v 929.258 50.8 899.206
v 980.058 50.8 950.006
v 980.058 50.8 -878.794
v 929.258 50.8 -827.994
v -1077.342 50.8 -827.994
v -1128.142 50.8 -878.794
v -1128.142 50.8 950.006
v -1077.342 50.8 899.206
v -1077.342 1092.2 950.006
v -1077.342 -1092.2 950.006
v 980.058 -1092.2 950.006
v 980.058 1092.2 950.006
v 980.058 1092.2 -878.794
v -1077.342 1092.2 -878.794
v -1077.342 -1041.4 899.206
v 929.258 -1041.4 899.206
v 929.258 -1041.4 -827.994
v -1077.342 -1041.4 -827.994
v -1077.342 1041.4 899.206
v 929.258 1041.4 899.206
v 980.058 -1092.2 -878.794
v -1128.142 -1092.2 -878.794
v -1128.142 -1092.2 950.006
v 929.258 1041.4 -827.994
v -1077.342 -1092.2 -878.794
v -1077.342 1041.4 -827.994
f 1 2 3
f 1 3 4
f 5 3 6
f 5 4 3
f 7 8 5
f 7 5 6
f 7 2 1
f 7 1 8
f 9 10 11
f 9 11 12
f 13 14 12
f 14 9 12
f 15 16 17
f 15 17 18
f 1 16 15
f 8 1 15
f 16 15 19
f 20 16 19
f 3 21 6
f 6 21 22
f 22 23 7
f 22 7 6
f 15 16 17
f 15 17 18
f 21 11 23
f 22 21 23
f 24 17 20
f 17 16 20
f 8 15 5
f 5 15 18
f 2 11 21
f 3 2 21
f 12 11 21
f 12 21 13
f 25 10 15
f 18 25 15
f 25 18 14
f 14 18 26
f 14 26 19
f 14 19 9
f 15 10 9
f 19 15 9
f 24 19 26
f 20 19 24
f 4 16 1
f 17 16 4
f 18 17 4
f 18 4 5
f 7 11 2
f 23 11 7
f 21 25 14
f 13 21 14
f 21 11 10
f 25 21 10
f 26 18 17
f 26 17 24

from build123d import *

# Parameters (mm, degrees)
F0_W     = 97.2830057144
F0_H     = 71.2111592293
F1_DEPTH = 1092.2
F2_DEPTH = 1028.7
F3_DEPTH = 914.4
F4_T     = -50.8
F5_DEPTH = 1092.2
F6_T     = 50.8


with BuildPart() as f1:
    # F0 (on Front) → F1 (new body, symmetric)
    with BuildSketch(Plane.XZ):
        Rectangle(F0_W, F0_H)
    extrude(amount=F1_DEPTH, both=True)

    # F2 (add, symmetric): a face of the model
    f2_faces = [f1.faces().sort_by_distance(p)[0] for p in [
        (-48.6415028572, 0, 0),
    ]]
    extrude(f2_faces, amount=F2_DEPTH, both=True)

    # F3 (add, symmetric): a face of the model
    f3_faces = [f1.faces().sort_by_distance(p)[0] for p in [
        (-48.6415028572, 0, 35.6055796146),
    ]]
    extrude(f3_faces, amount=F3_DEPTH, both=True)

    # F4
    f4_openings = [f1.faces().sort_by_distance(p)[0] for p in [
        (-1077.341503, 0, 35.60558),
    ]]
    offset(amount=F4_T, openings=f4_openings)


with BuildPart() as f5:
    # F5 (new): a face of the model
    f5_faces = [f1.part.faces().sort_by_distance(p)[0] for p in [
        (-74.0415028572, -1041.4, 35.6055796146),
    ]]
    extrude(f5_faces, amount=F5_DEPTH)

    # F6
    f6_openings = [f5.faces().sort_by_distance(p)[0] for p in [
        (-74.041503, 50.8, 35.60558),
    ]]
    offset(amount=F6_T, openings=f6_openings, kind=Kind.INTERSECTION)


solid = Compound([f1.part, f5.part])
